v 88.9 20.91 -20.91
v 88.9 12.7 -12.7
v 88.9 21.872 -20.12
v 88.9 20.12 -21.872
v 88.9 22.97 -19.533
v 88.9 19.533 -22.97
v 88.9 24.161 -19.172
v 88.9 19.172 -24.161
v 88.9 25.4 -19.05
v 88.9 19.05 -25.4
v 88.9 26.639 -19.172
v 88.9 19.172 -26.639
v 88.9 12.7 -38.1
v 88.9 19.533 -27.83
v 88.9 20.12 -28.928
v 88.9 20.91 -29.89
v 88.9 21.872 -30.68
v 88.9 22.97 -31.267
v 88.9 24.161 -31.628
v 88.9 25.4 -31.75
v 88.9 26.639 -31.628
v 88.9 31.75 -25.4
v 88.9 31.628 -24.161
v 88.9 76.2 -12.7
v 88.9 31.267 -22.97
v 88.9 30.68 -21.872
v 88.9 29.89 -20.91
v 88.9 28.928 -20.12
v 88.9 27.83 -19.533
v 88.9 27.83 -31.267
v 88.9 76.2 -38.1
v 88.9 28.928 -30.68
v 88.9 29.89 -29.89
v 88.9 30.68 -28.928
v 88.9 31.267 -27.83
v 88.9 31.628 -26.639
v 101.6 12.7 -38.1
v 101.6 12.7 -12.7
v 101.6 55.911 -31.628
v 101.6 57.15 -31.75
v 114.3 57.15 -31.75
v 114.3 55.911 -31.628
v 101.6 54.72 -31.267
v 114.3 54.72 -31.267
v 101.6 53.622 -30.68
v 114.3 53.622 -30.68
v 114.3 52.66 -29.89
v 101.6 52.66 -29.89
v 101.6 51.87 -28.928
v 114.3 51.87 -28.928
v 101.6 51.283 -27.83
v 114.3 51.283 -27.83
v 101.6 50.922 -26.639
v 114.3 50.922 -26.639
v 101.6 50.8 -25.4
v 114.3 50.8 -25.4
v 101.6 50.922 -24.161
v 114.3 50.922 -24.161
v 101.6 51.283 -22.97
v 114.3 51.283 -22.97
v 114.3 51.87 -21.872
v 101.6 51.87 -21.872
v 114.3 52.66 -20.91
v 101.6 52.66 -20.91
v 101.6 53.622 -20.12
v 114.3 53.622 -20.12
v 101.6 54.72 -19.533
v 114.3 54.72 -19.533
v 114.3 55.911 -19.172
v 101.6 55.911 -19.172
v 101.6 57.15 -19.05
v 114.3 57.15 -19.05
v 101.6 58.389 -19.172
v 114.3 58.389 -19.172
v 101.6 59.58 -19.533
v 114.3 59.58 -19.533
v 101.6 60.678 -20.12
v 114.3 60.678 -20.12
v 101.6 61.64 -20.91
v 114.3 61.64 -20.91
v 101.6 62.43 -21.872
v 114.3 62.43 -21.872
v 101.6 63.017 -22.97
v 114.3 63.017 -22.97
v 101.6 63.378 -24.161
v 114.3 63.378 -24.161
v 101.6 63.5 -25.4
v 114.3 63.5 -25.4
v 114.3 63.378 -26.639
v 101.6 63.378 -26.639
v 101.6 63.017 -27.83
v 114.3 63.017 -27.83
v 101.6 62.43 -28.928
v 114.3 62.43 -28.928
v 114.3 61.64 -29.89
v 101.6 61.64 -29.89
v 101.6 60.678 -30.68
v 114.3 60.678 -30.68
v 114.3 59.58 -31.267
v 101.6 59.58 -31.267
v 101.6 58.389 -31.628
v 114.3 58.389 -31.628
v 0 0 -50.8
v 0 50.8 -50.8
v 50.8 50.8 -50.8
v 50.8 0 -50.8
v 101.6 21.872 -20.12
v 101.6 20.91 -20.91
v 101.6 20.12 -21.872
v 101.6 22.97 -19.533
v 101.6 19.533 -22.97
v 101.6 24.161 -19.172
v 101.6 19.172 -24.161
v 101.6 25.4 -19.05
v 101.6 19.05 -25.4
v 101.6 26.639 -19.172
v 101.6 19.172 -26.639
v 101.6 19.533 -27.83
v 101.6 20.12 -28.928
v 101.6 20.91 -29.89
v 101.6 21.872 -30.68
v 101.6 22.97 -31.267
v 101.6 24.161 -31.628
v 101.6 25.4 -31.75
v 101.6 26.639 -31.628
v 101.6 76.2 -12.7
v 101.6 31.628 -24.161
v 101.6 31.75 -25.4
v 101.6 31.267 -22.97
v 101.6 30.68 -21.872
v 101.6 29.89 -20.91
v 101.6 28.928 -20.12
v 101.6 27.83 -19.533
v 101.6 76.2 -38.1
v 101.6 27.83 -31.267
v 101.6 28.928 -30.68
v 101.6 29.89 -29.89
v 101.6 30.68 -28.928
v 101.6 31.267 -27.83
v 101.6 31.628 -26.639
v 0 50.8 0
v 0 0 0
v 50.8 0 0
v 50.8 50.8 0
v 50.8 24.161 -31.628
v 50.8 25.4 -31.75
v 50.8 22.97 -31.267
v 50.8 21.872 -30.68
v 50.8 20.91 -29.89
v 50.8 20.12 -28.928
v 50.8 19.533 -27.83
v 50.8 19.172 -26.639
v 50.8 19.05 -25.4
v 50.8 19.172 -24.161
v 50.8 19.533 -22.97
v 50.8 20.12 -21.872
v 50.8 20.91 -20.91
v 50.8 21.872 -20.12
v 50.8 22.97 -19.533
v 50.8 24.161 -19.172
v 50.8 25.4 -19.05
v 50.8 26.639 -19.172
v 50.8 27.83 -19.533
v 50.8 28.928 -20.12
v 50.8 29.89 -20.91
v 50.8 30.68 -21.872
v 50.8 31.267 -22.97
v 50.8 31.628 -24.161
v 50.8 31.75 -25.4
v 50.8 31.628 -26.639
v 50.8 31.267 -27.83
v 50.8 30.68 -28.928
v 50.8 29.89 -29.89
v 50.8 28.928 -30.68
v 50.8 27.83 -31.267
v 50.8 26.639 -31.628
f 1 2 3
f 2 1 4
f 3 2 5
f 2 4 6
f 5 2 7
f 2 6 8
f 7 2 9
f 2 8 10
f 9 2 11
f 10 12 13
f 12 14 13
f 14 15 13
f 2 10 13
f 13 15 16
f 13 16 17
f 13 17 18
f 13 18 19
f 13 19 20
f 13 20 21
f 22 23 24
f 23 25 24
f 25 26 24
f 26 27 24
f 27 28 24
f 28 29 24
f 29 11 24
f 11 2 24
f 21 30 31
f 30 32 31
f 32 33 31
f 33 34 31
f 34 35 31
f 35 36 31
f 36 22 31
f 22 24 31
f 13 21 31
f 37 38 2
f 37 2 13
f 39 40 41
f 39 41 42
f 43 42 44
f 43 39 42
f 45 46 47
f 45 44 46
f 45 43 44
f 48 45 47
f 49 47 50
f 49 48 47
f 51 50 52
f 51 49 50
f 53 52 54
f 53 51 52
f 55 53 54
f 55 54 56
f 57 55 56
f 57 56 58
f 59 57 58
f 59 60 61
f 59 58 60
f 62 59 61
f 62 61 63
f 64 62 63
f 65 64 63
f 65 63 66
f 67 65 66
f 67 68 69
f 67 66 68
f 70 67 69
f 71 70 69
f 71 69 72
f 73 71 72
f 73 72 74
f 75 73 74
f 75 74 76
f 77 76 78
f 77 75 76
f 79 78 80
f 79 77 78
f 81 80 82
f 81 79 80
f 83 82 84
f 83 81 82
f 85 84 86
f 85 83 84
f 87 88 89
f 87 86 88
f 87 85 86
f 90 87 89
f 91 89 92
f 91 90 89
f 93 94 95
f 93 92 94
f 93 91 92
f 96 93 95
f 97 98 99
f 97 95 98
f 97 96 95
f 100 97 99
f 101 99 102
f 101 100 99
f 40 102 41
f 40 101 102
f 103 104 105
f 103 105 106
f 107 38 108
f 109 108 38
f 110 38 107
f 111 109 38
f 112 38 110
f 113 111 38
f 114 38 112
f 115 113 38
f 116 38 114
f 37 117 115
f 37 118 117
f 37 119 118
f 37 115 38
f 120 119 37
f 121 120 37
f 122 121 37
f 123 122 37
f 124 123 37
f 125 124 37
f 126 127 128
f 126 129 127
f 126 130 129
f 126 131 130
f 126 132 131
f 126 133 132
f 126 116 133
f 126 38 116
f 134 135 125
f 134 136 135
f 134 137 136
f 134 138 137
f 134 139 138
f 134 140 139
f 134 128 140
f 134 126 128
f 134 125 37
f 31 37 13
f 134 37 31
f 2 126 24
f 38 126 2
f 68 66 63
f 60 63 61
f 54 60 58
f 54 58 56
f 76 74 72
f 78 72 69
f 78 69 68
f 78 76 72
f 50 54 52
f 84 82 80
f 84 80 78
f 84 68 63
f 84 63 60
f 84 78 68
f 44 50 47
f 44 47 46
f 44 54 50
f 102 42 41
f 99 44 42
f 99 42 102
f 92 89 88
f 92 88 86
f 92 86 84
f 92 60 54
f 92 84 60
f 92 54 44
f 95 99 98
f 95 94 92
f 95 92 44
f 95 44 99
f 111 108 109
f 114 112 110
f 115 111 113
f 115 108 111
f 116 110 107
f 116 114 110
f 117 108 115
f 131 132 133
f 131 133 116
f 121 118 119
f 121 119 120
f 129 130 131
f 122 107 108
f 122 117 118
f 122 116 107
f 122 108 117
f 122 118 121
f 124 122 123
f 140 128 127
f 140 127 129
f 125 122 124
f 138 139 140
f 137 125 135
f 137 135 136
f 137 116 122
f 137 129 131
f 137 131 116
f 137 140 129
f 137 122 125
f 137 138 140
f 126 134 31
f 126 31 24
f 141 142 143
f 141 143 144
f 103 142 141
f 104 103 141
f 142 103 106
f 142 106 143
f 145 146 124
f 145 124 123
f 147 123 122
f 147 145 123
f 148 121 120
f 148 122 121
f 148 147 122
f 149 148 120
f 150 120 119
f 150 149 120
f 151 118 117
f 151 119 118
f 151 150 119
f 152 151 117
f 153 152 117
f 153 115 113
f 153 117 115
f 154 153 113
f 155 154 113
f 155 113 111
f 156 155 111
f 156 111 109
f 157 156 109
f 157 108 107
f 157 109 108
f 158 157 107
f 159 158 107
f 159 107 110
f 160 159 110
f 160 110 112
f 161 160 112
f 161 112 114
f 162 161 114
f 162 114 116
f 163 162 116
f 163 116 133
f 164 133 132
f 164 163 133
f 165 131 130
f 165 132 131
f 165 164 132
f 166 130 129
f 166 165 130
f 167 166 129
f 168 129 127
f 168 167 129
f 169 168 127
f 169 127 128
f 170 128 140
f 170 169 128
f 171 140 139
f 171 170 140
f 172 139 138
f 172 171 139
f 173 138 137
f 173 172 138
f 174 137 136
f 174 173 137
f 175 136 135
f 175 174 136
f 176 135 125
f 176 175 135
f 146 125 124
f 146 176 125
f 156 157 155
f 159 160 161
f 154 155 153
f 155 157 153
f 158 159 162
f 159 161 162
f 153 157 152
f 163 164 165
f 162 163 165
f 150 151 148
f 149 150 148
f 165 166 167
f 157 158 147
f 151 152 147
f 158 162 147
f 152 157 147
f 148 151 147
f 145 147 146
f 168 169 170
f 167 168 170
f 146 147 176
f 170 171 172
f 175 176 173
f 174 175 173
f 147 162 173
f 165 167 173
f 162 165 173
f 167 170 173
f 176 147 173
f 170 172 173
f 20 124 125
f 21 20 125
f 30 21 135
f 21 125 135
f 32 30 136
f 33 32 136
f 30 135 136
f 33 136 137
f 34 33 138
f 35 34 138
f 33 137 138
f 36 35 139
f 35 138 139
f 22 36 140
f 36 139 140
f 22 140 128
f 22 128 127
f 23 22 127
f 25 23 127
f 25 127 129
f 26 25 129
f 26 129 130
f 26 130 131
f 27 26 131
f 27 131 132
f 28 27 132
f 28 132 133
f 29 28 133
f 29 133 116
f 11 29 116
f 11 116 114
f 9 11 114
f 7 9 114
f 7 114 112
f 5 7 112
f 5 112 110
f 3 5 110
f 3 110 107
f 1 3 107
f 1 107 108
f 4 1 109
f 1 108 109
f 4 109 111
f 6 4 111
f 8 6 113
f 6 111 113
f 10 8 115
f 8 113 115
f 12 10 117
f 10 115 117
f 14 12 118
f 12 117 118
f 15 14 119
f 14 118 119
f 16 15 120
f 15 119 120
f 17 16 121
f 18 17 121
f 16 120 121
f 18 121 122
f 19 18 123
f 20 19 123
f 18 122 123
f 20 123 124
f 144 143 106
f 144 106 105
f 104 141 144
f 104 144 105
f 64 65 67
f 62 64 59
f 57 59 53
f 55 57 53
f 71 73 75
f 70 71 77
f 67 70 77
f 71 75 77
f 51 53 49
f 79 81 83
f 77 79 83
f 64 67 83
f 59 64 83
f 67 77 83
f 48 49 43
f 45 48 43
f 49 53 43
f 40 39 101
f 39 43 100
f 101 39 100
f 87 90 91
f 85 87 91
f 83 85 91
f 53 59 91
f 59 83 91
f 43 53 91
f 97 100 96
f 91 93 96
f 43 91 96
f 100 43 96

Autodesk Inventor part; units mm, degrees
ref_plane "YZ Plane" through (0, 0, 0) normal (1, 0, 0) x (0, 1, 0)
ref_plane "XZ Plane" through (0, 0, 0) normal (0, 1, 0) x (-1, 0, 0)
ref_plane "XY Plane" through (0, 0, 0) normal (0, 0, 1) x (1, 0, 0)
sketch "Sketch1" plane through (0, 0, 0) normal (1, 0, 0) x (0, 1, 0)
  line L0 (0, 0) -> (50.8, 0)
  line L1 (50.8, 0) -> (50.8, -50.8)
  line L2 (50.8, -50.8) -> (0, -50.8)
  line L3 (0, -50.8) -> (0, 0)
  dimension "d0" = 50.8
  dimension "d1" = 50.8
extrude "Extrusion1" add sketch "Sketch1" along normal blind 50.8
sketch "Sketch2" plane through (50.8, 0, 0) normal (1, 0, 0) x (0, 0, -1)
  circle A0 centre (25.4, 25.4) radius 6.35
  line L0 (0, 50.8) -> (0, 0) projected
  line L1 (0, 0) -> (50.8, 0) projected
  dimension "d4" = 12.7
  dimension "d5" = 25.4
  dimension "d6" = 25.4
extrude "Extrusion2" add sketch "Sketch2" along normal blind 50.8 separate body
sketch "Sketch3" plane through (101.6, 25.4, -25.4) normal (1, 0, 0) x (0, 0, -1)
  line L0 (-12.7, -12.7) -> (12.7, -12.7)
  line L1 (12.7, -12.7) -> (12.7, 50.8)
  line L2 (12.7, 50.8) -> (-12.7, 50.8)
  line L3 (-12.7, 50.8) -> (-12.7, -12.7)
  circle A0 centre (0, 0) radius 6.35 projected
  point P0 (-25.4, -25.4)
  dimension "d9" = 25.4
  dimension "d10" = 63.5
  dimension "d11" = 12.7
  dimension "d12" = 12.7
  dimension "d16" = 12.7
extrude "Extrusion3" add sketch "Sketch3" against normal blind 12.7 separate body
sketch "Sketch5" plane through (101.6, 25.4, -25.4) normal (1, 0, 0) x (0, 0, -1)
  circle A0 centre (0, 31.75) radius 6.35
  line L0 (12.7, 50.8) -> (-12.7, 50.8) projected
  line L1 (-12.7, 50.8) -> (-12.7, -12.7) projected
  point P0 (-25.4, -25.4)
  dimension "d20" = 12.7
  dimension "d21" = 25.4
  dimension "d22" = 12.7
  dimension "d23" = 19.05
extrude "Extrusion6" add sketch "Sketch5" along normal blind 12.7 separate body
equation "\"d22\" = 0.5 * d21"
properties part number "SkeletalStuff"
